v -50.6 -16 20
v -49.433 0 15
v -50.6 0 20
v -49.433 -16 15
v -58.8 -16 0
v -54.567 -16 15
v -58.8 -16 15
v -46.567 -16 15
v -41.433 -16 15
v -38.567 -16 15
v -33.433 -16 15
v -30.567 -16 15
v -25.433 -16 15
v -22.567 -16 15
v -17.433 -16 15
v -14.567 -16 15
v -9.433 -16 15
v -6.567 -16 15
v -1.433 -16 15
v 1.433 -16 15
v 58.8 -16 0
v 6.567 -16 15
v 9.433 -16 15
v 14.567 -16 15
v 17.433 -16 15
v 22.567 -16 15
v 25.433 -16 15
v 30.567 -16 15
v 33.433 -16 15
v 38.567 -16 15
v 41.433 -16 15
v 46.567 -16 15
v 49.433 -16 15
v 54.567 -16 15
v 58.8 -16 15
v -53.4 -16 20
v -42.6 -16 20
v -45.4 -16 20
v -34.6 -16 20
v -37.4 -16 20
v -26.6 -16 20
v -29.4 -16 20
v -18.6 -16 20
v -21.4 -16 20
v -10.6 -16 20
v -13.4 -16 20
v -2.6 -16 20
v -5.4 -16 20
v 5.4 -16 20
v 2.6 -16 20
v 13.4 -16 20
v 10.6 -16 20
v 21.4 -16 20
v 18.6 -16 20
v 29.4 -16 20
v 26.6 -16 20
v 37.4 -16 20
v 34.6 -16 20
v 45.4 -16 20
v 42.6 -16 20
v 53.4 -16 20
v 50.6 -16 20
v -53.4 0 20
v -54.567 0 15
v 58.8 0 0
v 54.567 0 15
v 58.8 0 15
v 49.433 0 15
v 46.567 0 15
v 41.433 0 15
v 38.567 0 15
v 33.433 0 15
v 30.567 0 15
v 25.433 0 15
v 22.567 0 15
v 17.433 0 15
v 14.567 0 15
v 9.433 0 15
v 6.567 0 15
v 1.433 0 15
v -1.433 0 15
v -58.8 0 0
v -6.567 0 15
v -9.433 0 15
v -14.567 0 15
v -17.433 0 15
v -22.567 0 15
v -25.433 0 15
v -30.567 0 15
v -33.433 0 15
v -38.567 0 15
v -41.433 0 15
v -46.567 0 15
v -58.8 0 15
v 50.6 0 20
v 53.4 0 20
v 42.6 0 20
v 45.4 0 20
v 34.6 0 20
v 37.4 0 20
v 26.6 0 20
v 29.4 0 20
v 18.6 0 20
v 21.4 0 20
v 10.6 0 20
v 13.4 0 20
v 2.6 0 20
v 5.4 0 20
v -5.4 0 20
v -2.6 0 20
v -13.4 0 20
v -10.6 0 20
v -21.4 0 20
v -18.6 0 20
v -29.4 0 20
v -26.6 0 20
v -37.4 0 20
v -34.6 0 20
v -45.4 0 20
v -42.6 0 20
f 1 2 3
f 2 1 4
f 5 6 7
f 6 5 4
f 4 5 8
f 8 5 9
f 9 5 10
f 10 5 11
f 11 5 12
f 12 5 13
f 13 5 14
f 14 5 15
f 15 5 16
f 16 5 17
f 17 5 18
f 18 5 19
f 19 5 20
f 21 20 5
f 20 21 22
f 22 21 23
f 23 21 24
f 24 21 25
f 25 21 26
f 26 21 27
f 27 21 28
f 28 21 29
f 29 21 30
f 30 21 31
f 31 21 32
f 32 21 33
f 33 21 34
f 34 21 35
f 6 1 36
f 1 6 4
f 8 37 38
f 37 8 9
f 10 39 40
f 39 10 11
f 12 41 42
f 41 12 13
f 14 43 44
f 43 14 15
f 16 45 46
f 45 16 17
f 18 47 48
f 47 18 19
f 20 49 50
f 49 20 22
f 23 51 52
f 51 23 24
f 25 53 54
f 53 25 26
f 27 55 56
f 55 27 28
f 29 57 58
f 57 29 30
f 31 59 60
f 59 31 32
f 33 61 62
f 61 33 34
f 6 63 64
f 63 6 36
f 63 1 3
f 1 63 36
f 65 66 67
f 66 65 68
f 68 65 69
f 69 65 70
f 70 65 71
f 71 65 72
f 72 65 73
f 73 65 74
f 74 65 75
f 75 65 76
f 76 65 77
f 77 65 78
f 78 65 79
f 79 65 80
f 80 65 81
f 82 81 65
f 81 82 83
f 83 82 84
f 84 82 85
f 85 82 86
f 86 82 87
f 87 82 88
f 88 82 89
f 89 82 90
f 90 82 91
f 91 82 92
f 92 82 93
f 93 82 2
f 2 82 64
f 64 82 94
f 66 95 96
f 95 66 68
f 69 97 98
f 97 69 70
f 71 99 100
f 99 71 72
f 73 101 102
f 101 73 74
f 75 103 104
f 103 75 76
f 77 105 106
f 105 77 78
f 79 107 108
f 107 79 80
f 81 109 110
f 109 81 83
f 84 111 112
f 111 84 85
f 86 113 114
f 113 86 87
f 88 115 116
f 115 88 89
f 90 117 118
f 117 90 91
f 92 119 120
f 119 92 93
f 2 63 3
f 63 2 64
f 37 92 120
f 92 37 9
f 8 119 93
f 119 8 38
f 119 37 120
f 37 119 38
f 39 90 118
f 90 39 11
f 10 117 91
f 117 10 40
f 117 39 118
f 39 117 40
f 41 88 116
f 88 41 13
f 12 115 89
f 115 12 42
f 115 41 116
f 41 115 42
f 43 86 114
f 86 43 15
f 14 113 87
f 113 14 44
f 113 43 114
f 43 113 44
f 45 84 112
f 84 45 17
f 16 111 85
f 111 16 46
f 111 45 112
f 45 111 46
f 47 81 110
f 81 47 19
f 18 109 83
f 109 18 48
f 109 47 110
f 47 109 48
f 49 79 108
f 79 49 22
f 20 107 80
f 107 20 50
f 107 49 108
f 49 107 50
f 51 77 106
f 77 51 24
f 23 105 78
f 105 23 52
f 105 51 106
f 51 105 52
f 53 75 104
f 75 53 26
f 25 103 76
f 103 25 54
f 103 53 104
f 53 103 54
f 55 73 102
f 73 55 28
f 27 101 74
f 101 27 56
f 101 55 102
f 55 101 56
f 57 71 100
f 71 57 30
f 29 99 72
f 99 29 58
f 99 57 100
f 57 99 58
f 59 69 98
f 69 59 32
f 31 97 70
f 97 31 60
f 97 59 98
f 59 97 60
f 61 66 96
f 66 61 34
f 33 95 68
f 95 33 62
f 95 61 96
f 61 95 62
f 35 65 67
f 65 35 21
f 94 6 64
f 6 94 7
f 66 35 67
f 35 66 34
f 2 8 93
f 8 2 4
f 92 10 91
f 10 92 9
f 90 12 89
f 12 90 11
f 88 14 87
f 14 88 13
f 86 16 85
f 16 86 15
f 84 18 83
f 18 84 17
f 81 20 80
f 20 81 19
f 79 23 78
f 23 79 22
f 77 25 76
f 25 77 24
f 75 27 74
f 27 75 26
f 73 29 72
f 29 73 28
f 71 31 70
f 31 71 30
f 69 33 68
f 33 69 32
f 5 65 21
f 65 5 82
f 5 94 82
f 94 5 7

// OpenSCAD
$fn = 32;

// ----------------------------------------------------------------------
// Toothed rack, 14 teeth
// 8 mm pitch, 5 mm teeth
// ----------------------------------------------------------------------

// --- parameters (mm) ---
bar_w = 16;     // bar width (Y)
bar_h = 15;     // bar height (Z)
teeth = 14;     // number of teeth
pitch = 8;      // tooth pitch
tooth_h = 5;    // tooth height above the bar
root_w = 5.6;   // tooth width at the root
crest_w = 2.8;  // tooth width at the crest

// --- derived feature positions (mm) ---
span = (teeth - 1) * pitch;  // = 104   distance between the outer teeth
bar_l = span + root_w + 8;   // = 117.6   bar length: teeth plus 4 mm at each end
tooth_x = -span / 2;         // = -52   X of the first tooth
height = bar_h + tooth_h;    // = 20   overall height
feature_centers = [
  [tooth_x + 0 * pitch, -bar_w / 2],
  [tooth_x + 1 * pitch, -bar_w / 2],
  [tooth_x + 2 * pitch, -bar_w / 2],
  [tooth_x + 3 * pitch, -bar_w / 2],
  [tooth_x + 4 * pitch, -bar_w / 2],
  [tooth_x + 5 * pitch, -bar_w / 2],
  [tooth_x + 6 * pitch, -bar_w / 2],
  [tooth_x + 7 * pitch, -bar_w / 2],
  [tooth_x + 8 * pitch, -bar_w / 2],
  [tooth_x + 9 * pitch, -bar_w / 2],
  [tooth_x + 10 * pitch, -bar_w / 2],
  [tooth_x + 11 * pitch, -bar_w / 2],
  [tooth_x + 12 * pitch, -bar_w / 2],
  [tooth_x + 13 * pitch, -bar_w / 2]
];   // tooth centre line, drives the tooth loop

// bar with a rack of teeth, one extruded trapezoium per centre
module rack_tooth() {
  linear_extrude(height = bar_w)
    polygon(points = [
      [0, 0],
      [root_w, 0],
      [root_w / 2 + crest_w / 2, tooth_h + 1],
      [root_w / 2 - crest_w / 2, tooth_h + 1]
    ]);
}

union() {
  translate([-bar_l / 2, -bar_w, 0]) cube([bar_l, bar_w, bar_h]);
  for (centre = feature_centers)
    translate([centre[0] - root_w / 2, 0, bar_h - 1]) rotate([90, 0, 0]) rack_tooth();
}
